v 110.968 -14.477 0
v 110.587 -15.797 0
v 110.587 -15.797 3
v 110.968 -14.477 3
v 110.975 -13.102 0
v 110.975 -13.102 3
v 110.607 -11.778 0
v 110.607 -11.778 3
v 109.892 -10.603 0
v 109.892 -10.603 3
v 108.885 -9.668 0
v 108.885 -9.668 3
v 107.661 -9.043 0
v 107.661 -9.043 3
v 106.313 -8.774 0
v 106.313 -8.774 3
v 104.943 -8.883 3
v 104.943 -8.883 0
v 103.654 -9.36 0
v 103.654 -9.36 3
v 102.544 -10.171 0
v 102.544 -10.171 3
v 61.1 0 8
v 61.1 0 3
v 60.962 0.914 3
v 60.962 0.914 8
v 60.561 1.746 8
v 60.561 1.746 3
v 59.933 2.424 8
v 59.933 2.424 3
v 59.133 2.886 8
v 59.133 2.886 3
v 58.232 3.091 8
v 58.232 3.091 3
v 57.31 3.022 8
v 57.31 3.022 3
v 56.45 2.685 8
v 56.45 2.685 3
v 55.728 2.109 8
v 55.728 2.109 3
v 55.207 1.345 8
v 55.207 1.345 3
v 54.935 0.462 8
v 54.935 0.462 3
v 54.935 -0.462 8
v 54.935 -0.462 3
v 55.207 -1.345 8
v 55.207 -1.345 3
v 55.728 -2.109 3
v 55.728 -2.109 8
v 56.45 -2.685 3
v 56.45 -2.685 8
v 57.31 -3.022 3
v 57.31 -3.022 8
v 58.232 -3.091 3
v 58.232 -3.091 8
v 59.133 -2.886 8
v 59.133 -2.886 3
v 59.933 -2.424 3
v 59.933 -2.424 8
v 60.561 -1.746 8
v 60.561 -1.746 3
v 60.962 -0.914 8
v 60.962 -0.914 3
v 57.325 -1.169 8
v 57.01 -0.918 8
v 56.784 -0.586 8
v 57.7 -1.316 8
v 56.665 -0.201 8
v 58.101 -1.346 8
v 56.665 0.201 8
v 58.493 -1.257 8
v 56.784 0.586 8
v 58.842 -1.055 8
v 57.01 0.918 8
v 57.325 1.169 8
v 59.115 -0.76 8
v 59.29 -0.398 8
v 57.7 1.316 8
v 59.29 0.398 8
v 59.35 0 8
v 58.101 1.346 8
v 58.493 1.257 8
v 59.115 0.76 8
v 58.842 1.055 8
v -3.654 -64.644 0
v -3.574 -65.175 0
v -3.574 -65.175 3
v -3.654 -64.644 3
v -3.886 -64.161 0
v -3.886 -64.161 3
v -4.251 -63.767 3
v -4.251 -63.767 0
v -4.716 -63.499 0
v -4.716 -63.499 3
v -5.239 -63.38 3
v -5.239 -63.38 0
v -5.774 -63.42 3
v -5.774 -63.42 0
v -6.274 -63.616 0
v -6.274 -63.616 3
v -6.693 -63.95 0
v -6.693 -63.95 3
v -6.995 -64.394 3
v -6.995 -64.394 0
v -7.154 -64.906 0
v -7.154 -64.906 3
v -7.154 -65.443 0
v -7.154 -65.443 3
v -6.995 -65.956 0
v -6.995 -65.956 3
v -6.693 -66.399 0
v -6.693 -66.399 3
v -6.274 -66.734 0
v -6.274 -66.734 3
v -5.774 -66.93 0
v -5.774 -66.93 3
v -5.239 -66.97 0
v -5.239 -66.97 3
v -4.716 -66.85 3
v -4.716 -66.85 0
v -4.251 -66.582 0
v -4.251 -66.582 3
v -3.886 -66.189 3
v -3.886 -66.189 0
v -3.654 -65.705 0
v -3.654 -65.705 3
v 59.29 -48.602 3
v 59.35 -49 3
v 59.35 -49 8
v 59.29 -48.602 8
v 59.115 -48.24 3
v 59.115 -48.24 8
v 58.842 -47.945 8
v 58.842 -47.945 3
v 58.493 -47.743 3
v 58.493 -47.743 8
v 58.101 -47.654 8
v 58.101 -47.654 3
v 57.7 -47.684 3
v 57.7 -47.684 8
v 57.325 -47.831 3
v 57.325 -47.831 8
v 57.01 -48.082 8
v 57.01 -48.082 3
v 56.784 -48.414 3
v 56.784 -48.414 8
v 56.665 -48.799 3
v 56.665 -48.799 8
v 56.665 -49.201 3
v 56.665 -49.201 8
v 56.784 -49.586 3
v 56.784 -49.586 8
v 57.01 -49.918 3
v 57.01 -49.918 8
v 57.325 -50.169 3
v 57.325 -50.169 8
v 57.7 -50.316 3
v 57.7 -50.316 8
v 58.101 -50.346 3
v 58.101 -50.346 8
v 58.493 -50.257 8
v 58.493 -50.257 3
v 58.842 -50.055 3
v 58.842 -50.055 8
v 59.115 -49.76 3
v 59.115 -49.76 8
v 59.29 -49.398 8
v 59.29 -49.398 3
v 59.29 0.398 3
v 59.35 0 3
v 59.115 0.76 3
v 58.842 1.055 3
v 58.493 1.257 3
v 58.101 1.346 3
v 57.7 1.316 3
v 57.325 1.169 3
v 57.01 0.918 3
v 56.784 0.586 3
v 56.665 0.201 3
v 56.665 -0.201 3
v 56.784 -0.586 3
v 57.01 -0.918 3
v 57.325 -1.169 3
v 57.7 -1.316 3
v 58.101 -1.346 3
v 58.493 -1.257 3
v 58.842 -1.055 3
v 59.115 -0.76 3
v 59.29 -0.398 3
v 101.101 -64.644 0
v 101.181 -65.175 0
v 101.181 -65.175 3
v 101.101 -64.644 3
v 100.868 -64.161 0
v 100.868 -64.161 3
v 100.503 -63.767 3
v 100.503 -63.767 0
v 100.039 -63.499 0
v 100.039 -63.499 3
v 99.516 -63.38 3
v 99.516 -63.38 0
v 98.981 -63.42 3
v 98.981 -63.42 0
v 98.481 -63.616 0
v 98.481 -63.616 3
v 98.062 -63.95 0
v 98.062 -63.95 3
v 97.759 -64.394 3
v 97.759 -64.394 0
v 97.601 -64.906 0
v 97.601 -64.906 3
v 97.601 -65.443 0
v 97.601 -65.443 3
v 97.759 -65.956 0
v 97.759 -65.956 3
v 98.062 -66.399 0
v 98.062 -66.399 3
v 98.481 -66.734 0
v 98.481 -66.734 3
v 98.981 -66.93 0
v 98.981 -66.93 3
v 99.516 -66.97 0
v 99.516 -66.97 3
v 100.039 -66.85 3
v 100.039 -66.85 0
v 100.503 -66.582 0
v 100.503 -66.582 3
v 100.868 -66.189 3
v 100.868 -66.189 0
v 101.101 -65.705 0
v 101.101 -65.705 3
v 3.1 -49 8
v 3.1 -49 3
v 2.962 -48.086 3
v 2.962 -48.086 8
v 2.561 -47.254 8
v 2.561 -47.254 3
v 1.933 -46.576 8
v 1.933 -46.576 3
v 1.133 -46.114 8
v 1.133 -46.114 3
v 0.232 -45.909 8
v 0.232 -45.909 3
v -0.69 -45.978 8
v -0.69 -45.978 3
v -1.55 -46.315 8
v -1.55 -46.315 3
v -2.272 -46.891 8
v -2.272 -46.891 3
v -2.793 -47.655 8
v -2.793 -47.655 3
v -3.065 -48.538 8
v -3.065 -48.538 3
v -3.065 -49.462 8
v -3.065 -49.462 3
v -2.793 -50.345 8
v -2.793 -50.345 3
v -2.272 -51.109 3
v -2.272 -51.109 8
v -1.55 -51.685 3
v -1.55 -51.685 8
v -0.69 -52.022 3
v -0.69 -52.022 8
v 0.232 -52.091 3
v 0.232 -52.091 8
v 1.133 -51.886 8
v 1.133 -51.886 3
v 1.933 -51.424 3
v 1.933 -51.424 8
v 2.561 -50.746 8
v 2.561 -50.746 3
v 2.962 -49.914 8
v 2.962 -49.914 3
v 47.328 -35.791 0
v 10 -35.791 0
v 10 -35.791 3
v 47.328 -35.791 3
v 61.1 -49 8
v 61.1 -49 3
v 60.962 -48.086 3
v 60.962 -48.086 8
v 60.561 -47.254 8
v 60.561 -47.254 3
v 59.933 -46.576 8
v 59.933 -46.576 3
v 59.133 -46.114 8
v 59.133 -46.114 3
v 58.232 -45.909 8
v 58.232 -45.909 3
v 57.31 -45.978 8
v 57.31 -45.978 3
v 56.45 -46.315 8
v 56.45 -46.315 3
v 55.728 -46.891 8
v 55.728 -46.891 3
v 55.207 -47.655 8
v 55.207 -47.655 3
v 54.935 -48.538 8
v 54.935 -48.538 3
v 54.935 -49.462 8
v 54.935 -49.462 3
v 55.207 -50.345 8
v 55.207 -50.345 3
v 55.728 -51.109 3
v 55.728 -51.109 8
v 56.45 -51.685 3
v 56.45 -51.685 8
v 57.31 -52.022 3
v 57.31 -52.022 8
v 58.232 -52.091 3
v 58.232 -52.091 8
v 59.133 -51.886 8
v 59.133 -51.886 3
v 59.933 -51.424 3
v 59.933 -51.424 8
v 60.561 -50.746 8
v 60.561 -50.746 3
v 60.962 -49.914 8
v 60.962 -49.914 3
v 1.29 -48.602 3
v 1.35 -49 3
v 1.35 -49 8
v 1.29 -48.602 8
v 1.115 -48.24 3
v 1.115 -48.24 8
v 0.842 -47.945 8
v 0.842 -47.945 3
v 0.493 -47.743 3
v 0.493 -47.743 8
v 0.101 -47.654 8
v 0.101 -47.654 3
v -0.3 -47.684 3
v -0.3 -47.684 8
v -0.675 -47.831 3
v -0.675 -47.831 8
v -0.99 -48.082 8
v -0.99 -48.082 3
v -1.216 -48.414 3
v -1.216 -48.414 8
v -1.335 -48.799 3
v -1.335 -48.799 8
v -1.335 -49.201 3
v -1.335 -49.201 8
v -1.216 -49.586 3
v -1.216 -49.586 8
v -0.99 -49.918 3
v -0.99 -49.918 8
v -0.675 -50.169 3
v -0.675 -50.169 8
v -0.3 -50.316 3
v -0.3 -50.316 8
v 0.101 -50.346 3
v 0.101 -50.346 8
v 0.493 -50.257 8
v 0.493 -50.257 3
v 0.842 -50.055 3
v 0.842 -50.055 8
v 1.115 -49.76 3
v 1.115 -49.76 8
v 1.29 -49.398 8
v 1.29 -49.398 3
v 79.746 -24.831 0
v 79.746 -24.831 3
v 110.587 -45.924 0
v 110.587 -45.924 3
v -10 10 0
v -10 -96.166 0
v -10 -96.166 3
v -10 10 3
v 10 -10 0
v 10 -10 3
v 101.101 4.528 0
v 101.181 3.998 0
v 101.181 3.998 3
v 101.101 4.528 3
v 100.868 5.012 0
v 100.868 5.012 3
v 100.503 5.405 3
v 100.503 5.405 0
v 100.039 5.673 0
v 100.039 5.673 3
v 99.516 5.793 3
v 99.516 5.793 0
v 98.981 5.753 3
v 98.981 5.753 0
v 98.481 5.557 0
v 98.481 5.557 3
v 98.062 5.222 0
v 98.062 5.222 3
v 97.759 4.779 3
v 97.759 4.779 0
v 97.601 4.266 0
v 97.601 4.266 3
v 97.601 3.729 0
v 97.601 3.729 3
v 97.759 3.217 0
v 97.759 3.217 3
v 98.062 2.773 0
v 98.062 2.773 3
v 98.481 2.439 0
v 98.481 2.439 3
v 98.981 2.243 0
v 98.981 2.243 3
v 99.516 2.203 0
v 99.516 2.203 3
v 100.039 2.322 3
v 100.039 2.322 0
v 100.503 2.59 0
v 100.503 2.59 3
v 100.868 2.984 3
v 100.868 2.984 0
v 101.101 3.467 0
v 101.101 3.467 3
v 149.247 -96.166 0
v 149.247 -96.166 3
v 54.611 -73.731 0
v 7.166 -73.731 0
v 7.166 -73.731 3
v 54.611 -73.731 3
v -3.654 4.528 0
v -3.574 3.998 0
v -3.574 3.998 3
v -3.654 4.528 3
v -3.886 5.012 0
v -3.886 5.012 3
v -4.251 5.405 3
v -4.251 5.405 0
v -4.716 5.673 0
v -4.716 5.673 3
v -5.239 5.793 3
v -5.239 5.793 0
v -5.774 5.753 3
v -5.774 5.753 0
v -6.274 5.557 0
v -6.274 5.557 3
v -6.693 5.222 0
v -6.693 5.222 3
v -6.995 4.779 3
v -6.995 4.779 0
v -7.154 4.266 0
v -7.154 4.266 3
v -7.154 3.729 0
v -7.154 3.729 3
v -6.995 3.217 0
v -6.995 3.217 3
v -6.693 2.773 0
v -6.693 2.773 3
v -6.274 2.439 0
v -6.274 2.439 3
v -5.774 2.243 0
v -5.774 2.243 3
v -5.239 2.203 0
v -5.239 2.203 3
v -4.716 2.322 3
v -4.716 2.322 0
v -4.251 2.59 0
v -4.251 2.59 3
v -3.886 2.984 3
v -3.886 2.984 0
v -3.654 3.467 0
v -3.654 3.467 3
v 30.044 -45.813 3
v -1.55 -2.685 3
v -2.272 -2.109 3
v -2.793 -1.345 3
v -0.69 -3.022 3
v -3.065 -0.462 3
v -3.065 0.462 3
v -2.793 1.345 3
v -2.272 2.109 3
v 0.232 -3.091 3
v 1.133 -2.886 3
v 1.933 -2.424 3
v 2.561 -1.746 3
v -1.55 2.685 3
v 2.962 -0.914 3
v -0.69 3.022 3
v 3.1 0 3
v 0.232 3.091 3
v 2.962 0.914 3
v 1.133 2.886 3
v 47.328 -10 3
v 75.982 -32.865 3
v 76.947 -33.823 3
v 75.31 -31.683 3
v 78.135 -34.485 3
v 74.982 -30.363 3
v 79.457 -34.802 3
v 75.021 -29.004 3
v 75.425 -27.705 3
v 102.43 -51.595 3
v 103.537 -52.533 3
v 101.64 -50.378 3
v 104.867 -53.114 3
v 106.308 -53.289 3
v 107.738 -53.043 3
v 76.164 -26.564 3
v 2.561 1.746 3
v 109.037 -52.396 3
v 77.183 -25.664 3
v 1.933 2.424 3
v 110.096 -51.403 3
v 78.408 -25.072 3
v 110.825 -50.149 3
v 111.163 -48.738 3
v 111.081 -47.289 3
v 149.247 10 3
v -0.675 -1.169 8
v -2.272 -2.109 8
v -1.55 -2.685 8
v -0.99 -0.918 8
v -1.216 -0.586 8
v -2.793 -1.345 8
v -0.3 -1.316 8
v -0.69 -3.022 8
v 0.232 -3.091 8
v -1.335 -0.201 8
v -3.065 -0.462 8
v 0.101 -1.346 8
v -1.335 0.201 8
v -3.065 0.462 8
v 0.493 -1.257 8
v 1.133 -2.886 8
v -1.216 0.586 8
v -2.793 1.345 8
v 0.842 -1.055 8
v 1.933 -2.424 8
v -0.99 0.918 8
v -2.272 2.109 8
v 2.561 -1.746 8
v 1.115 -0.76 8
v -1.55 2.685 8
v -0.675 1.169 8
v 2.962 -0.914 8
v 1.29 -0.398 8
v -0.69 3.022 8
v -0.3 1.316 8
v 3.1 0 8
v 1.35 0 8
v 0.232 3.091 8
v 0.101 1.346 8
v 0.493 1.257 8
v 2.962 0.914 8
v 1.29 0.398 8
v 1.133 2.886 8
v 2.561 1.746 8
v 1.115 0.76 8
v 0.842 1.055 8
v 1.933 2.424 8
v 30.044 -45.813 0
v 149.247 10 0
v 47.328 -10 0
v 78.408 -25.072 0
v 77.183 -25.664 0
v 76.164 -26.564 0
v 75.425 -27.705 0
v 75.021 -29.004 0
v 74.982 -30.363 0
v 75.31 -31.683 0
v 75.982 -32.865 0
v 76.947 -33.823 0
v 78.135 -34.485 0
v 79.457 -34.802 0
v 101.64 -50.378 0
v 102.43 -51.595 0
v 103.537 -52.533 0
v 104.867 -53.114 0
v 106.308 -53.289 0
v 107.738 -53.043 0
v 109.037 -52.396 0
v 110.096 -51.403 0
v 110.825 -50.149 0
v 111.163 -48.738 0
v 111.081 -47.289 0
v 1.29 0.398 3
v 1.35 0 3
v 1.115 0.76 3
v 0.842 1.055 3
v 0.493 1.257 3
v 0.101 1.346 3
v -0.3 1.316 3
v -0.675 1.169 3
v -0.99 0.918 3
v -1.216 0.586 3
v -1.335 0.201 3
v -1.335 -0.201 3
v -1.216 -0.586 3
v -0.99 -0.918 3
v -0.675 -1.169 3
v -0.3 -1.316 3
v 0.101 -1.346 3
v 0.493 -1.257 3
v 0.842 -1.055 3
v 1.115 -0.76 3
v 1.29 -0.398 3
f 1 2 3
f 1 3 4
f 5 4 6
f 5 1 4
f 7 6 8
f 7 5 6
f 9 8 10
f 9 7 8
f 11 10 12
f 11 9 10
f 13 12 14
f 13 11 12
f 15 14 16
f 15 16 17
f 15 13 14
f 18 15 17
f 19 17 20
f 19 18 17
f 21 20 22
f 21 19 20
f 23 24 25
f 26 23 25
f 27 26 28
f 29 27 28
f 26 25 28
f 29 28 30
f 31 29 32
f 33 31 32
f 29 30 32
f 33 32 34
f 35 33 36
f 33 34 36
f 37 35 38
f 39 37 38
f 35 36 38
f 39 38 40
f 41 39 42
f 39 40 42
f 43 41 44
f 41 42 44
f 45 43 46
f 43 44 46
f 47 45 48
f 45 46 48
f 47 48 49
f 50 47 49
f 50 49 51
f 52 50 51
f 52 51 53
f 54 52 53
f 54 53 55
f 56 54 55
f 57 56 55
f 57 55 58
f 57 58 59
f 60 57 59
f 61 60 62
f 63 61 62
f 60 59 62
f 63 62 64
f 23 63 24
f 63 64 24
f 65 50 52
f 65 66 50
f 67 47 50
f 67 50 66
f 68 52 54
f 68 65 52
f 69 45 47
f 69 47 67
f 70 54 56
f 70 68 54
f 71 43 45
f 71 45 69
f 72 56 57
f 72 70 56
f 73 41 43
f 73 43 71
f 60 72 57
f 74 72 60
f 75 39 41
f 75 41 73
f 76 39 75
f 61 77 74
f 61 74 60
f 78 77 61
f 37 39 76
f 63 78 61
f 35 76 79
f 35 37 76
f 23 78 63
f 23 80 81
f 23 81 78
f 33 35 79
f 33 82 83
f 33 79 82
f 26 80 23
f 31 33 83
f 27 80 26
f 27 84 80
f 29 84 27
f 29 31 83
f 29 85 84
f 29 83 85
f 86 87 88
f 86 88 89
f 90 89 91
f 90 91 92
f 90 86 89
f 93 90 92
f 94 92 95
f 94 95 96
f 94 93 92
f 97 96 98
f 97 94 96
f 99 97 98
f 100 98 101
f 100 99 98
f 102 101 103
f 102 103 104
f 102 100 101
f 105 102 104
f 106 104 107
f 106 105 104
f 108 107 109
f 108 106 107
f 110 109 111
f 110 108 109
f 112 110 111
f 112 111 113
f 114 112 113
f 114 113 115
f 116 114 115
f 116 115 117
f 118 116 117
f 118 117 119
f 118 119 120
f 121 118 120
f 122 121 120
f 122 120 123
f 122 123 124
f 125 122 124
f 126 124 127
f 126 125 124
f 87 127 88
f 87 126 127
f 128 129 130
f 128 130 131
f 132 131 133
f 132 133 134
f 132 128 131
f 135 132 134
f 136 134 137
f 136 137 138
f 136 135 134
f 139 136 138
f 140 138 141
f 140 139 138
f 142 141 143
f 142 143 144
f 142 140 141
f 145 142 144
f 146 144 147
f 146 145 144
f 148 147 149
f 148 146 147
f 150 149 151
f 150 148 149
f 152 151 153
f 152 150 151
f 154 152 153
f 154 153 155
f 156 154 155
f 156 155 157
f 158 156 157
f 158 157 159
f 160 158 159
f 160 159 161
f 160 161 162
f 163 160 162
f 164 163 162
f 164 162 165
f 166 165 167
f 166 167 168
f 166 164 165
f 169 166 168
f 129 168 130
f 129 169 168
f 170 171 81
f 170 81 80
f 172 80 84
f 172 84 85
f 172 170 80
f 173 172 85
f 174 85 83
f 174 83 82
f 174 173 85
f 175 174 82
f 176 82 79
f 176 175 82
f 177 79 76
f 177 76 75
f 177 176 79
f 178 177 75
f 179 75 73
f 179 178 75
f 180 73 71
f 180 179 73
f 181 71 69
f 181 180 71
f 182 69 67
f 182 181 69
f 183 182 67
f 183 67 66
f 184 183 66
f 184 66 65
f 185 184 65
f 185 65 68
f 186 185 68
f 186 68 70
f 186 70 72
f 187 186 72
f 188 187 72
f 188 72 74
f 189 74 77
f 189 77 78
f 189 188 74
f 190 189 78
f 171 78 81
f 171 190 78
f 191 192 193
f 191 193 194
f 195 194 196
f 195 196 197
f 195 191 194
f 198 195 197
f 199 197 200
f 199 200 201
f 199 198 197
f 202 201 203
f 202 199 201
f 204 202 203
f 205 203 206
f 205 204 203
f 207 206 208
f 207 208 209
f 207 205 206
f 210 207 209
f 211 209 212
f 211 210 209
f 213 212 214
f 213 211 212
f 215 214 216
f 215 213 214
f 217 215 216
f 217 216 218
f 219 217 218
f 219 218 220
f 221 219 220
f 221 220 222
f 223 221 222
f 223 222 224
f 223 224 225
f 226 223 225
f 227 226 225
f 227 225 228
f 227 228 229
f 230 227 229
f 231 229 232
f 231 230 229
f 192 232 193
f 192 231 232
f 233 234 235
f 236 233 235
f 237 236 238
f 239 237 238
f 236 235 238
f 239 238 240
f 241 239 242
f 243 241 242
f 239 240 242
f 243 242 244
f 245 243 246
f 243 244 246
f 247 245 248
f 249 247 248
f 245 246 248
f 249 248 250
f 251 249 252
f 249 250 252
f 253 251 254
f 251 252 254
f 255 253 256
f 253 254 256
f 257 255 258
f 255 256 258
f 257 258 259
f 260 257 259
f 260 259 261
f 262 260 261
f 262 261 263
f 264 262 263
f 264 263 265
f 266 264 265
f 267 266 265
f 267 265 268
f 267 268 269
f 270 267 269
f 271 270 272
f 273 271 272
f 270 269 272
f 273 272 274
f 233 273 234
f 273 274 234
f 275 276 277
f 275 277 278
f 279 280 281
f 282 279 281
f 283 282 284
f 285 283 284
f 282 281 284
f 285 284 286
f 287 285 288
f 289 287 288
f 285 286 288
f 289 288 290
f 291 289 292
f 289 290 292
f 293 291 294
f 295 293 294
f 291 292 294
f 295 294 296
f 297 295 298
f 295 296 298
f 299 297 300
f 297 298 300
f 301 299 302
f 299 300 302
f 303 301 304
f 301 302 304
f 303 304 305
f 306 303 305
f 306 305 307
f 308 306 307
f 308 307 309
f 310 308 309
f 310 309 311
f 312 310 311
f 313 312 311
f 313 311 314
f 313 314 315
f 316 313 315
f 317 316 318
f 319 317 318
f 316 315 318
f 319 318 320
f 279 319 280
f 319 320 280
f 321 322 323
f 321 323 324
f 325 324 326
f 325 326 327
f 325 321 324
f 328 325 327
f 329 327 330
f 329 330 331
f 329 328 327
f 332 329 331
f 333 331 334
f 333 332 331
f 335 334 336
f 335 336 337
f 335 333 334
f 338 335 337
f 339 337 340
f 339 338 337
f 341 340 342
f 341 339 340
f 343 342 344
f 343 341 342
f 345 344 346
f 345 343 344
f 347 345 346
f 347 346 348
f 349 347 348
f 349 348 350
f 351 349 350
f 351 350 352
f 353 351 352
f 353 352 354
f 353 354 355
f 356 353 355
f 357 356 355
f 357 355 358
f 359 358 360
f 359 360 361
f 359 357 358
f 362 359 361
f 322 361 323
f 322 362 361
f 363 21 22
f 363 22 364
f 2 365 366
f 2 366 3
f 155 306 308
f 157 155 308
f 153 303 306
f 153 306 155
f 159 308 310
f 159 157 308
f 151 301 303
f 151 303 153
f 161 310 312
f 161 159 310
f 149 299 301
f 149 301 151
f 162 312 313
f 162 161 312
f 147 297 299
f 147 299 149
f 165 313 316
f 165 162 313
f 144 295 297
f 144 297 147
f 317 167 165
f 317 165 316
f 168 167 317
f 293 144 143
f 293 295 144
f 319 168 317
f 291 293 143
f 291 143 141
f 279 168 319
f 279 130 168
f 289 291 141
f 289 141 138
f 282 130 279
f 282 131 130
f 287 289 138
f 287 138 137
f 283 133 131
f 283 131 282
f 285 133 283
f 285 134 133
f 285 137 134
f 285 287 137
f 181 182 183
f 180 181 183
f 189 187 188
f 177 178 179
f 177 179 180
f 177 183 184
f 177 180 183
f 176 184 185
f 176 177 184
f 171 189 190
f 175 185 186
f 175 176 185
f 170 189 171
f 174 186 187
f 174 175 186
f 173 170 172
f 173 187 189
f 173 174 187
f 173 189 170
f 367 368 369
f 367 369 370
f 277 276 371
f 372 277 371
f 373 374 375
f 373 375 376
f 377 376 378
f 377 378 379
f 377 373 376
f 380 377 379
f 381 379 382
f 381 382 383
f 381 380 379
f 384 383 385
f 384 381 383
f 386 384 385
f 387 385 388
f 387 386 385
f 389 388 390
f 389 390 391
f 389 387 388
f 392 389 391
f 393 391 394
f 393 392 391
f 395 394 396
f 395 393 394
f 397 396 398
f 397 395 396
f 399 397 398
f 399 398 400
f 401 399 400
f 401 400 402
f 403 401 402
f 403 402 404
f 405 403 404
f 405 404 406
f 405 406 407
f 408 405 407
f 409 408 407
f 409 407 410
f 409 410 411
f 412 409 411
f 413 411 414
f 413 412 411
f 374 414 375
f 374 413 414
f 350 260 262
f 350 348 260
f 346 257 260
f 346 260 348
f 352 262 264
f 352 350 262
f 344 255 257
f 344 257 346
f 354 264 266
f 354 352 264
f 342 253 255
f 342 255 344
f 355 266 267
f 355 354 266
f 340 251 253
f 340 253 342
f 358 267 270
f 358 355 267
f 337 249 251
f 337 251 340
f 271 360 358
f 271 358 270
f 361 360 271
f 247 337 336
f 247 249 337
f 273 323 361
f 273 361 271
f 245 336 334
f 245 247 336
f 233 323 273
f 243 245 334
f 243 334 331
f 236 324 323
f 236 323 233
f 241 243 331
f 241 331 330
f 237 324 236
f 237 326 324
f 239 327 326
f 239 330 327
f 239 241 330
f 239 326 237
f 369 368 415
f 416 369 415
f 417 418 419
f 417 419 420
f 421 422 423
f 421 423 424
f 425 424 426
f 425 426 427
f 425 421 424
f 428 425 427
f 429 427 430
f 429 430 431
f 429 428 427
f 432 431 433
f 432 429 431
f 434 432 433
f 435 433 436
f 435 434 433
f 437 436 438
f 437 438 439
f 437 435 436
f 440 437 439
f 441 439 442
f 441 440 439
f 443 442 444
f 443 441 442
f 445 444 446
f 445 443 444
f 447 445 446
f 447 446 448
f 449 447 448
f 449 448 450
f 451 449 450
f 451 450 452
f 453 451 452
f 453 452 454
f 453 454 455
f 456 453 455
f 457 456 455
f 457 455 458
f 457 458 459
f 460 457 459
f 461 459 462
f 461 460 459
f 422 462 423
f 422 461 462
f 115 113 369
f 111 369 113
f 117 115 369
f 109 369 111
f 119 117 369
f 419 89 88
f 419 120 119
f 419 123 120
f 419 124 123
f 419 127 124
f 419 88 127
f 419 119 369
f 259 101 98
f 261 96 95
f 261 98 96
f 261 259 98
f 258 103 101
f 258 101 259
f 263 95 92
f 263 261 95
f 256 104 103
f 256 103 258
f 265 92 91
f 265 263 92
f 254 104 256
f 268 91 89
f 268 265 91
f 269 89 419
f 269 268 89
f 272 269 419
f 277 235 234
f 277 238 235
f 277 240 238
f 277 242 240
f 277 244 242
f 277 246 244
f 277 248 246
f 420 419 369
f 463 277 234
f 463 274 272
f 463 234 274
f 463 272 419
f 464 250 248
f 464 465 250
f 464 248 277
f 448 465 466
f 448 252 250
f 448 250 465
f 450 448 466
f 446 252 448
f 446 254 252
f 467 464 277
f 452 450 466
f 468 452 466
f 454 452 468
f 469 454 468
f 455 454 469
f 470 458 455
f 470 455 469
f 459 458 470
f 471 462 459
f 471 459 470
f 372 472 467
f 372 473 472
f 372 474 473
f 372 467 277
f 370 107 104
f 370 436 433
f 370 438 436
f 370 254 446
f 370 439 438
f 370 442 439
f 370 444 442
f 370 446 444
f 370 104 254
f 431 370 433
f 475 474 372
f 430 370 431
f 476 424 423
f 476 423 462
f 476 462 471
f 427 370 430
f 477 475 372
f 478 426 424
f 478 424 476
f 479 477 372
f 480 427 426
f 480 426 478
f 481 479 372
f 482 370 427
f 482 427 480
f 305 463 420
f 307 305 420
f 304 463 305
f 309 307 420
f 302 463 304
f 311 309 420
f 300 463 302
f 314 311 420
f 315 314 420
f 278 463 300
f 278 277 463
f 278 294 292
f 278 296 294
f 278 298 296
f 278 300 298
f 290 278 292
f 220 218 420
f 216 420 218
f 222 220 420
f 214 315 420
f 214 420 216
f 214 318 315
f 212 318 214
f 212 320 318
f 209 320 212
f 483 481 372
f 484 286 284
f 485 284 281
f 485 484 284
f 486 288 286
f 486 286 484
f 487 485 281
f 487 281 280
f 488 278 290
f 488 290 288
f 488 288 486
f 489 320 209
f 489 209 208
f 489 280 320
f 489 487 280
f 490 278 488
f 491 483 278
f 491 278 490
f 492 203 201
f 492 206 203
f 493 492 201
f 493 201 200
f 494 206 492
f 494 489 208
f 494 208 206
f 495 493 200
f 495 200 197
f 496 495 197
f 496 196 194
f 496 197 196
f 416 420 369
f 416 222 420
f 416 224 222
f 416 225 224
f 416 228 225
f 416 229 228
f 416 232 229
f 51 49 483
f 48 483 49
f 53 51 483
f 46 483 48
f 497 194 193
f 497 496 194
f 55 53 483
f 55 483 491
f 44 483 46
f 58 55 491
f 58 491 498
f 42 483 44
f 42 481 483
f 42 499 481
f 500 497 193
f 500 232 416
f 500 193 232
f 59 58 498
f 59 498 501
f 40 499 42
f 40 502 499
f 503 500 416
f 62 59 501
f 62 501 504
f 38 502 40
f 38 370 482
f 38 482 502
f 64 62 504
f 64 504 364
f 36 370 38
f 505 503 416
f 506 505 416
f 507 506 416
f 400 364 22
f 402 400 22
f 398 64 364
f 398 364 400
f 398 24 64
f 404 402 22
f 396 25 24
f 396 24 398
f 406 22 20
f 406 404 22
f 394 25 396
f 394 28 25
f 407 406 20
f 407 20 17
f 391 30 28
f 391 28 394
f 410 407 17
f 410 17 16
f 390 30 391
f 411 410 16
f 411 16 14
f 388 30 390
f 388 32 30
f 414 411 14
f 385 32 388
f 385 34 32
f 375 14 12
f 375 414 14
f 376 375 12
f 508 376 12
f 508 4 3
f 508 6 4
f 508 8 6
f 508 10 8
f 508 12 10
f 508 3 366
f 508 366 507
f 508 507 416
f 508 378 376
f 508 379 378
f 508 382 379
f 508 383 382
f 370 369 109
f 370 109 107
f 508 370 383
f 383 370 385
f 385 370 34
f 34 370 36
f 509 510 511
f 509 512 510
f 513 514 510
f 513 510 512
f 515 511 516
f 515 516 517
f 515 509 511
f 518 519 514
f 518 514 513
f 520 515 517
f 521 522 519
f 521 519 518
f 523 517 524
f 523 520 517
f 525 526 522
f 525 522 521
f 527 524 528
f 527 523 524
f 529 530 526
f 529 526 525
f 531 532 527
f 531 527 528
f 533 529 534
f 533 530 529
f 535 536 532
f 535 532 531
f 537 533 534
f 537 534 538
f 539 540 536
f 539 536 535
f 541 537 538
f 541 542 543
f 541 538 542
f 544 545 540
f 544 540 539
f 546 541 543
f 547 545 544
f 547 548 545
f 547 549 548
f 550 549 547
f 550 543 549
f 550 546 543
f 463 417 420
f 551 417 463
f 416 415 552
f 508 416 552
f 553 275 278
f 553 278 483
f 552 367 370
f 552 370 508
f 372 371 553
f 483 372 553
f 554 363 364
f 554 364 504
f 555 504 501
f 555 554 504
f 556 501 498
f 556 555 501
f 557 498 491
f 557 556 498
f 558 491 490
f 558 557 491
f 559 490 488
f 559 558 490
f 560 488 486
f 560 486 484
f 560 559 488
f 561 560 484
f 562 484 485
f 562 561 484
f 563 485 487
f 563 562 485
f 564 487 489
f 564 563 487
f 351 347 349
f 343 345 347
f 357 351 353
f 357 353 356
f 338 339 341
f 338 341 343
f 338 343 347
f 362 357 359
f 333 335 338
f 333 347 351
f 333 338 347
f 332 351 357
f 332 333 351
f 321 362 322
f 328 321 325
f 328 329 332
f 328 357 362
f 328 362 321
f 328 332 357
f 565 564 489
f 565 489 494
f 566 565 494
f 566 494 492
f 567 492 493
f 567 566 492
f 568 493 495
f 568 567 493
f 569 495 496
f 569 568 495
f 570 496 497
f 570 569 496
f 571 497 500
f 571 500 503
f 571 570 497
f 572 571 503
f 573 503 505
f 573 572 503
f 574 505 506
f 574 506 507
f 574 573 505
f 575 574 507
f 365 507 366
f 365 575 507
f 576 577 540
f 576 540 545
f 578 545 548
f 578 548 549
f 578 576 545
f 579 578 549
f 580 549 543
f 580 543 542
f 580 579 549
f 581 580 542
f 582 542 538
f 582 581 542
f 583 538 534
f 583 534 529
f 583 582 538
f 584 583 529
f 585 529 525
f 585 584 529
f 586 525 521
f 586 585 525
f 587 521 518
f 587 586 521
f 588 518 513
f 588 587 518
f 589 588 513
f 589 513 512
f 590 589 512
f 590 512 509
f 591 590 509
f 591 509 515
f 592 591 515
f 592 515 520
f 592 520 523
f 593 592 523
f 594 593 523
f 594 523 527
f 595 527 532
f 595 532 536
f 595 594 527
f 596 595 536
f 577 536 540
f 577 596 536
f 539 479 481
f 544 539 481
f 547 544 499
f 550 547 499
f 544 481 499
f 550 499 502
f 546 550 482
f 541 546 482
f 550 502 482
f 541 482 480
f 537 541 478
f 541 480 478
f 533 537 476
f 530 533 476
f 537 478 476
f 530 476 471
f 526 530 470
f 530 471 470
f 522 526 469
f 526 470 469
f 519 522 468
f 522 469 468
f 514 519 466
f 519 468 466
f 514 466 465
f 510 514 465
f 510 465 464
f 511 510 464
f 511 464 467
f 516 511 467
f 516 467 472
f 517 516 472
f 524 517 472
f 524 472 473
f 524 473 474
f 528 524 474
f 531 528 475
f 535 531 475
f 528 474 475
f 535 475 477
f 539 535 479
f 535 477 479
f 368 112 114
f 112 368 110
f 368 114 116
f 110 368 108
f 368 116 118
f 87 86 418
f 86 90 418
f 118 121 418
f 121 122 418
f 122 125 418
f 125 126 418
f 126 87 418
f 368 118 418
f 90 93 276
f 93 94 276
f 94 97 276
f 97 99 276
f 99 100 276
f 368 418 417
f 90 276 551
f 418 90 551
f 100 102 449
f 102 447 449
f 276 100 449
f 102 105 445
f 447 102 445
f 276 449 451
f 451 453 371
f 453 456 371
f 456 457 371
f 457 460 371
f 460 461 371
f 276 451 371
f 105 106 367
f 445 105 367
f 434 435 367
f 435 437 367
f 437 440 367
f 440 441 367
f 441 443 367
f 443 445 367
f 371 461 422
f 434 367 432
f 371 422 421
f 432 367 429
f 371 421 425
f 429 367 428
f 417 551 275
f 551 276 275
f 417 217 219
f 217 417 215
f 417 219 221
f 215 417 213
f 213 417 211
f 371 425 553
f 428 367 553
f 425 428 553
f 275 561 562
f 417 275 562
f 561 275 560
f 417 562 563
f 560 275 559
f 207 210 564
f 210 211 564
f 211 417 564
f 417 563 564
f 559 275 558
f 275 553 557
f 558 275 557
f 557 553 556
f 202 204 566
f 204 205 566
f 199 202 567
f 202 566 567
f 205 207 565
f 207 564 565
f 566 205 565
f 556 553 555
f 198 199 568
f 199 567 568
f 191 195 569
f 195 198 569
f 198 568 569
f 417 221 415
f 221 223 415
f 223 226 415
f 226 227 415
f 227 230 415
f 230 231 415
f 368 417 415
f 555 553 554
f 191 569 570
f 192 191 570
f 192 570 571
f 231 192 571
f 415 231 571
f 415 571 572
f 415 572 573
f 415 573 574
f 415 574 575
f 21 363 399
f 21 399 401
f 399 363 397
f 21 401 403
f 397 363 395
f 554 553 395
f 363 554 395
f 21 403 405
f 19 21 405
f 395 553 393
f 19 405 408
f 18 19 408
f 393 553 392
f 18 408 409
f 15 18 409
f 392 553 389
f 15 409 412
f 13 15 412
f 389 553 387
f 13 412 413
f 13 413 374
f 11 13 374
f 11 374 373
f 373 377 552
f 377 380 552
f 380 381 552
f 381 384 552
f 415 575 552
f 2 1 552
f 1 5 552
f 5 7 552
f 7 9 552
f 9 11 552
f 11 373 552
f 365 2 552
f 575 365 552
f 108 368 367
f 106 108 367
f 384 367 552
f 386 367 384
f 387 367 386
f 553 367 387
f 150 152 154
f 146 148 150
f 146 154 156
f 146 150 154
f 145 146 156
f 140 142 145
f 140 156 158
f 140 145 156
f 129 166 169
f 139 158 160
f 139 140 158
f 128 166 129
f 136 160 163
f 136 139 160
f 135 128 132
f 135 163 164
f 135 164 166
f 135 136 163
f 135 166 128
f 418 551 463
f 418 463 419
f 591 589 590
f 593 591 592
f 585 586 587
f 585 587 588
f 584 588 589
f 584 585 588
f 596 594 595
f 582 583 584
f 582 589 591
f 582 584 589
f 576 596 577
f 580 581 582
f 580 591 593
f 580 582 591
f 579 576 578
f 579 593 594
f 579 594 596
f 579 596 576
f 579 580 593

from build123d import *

# Parameters (mm, degrees)
SKETCH001_W   = 159.247498
SKETCH001_H   = 106.166245
SKETCH001_R   = 1.8
SKETCH001_W_2 = 37.327541
SKETCH001_H_2 = 25.790894
PAD_DEPTH     = 3
SKETCH_R      = 3.1
SKETCH_R_2    = 1.35
PAD004_DEPTH  = 5


with BuildPart() as part:
    # Sketch001 → Pad (new body)
    with BuildSketch(Plane.XY):
        with Locations((69.623749, -43.083122)):
            Rectangle(SKETCH001_W, SKETCH001_H)
        with Locations((-5.373725, 3.997676)):
            Circle(SKETCH001_R, mode=Mode.SUBTRACT)
        with Locations((99.381157, 3.997676)):
            Circle(SKETCH001_R, mode=Mode.SUBTRACT)
        with Locations((-5.373725, -65.174667)):
            Circle(SKETCH001_R, mode=Mode.SUBTRACT)
        with Locations((99.381157, -65.174667)):
            Circle(SKETCH001_R, mode=Mode.SUBTRACT)
        with Locations((28.66377, -22.895447)):
            Rectangle(SKETCH001_W_2, SKETCH001_H_2, mode=Mode.SUBTRACT)
        with BuildLine():
            Line((102.543606, -10.170694), (79.745988, -24.831094))
            ThreePointArc((79.745988, -24.831094), (74.954831, -29.68213), (79.457328, -34.802214))
            Line((79.457328, -34.802214), (101.639507, -50.378146))
            ThreePointArc((101.639507, -50.378146), (108.410837, -52.766648), (110.587478, -45.924273))
            Line((110.587478, -45.924273), (110.587478, -15.797321))
            ThreePointArc((110.587478, -15.797321), (108.884887, -9.668253), (102.543606, -10.170694))
        make_face(mode=Mode.SUBTRACT)
        Polygon((30.043512, -45.812858), (7.166186, -73.730591), (54.611111, -73.730591), align=None, mode=Mode.SUBTRACT)
    extrude(amount=PAD_DEPTH)

    # Sketch (on Face23 of Pad) → Pad004 (join)
    with BuildSketch(Plane.XY.offset(3)):
        Circle(SKETCH_R)
        Circle(SKETCH_R_2, mode=Mode.SUBTRACT)
        with Locations((58, 0)):
            Circle(SKETCH_R)
        with Locations((58, 0)):
            Circle(SKETCH_R_2, mode=Mode.SUBTRACT)
        with Locations((0, -49)):
            Circle(SKETCH_R)
        with Locations((0, -49)):
            Circle(SKETCH_R_2, mode=Mode.SUBTRACT)
        with Locations((58, -49)):
            Circle(SKETCH_R)
        with Locations((58, -49)):
            Circle(SKETCH_R_2, mode=Mode.SUBTRACT)
    extrude(amount=PAD004_DEPTH)


solid = part.part
